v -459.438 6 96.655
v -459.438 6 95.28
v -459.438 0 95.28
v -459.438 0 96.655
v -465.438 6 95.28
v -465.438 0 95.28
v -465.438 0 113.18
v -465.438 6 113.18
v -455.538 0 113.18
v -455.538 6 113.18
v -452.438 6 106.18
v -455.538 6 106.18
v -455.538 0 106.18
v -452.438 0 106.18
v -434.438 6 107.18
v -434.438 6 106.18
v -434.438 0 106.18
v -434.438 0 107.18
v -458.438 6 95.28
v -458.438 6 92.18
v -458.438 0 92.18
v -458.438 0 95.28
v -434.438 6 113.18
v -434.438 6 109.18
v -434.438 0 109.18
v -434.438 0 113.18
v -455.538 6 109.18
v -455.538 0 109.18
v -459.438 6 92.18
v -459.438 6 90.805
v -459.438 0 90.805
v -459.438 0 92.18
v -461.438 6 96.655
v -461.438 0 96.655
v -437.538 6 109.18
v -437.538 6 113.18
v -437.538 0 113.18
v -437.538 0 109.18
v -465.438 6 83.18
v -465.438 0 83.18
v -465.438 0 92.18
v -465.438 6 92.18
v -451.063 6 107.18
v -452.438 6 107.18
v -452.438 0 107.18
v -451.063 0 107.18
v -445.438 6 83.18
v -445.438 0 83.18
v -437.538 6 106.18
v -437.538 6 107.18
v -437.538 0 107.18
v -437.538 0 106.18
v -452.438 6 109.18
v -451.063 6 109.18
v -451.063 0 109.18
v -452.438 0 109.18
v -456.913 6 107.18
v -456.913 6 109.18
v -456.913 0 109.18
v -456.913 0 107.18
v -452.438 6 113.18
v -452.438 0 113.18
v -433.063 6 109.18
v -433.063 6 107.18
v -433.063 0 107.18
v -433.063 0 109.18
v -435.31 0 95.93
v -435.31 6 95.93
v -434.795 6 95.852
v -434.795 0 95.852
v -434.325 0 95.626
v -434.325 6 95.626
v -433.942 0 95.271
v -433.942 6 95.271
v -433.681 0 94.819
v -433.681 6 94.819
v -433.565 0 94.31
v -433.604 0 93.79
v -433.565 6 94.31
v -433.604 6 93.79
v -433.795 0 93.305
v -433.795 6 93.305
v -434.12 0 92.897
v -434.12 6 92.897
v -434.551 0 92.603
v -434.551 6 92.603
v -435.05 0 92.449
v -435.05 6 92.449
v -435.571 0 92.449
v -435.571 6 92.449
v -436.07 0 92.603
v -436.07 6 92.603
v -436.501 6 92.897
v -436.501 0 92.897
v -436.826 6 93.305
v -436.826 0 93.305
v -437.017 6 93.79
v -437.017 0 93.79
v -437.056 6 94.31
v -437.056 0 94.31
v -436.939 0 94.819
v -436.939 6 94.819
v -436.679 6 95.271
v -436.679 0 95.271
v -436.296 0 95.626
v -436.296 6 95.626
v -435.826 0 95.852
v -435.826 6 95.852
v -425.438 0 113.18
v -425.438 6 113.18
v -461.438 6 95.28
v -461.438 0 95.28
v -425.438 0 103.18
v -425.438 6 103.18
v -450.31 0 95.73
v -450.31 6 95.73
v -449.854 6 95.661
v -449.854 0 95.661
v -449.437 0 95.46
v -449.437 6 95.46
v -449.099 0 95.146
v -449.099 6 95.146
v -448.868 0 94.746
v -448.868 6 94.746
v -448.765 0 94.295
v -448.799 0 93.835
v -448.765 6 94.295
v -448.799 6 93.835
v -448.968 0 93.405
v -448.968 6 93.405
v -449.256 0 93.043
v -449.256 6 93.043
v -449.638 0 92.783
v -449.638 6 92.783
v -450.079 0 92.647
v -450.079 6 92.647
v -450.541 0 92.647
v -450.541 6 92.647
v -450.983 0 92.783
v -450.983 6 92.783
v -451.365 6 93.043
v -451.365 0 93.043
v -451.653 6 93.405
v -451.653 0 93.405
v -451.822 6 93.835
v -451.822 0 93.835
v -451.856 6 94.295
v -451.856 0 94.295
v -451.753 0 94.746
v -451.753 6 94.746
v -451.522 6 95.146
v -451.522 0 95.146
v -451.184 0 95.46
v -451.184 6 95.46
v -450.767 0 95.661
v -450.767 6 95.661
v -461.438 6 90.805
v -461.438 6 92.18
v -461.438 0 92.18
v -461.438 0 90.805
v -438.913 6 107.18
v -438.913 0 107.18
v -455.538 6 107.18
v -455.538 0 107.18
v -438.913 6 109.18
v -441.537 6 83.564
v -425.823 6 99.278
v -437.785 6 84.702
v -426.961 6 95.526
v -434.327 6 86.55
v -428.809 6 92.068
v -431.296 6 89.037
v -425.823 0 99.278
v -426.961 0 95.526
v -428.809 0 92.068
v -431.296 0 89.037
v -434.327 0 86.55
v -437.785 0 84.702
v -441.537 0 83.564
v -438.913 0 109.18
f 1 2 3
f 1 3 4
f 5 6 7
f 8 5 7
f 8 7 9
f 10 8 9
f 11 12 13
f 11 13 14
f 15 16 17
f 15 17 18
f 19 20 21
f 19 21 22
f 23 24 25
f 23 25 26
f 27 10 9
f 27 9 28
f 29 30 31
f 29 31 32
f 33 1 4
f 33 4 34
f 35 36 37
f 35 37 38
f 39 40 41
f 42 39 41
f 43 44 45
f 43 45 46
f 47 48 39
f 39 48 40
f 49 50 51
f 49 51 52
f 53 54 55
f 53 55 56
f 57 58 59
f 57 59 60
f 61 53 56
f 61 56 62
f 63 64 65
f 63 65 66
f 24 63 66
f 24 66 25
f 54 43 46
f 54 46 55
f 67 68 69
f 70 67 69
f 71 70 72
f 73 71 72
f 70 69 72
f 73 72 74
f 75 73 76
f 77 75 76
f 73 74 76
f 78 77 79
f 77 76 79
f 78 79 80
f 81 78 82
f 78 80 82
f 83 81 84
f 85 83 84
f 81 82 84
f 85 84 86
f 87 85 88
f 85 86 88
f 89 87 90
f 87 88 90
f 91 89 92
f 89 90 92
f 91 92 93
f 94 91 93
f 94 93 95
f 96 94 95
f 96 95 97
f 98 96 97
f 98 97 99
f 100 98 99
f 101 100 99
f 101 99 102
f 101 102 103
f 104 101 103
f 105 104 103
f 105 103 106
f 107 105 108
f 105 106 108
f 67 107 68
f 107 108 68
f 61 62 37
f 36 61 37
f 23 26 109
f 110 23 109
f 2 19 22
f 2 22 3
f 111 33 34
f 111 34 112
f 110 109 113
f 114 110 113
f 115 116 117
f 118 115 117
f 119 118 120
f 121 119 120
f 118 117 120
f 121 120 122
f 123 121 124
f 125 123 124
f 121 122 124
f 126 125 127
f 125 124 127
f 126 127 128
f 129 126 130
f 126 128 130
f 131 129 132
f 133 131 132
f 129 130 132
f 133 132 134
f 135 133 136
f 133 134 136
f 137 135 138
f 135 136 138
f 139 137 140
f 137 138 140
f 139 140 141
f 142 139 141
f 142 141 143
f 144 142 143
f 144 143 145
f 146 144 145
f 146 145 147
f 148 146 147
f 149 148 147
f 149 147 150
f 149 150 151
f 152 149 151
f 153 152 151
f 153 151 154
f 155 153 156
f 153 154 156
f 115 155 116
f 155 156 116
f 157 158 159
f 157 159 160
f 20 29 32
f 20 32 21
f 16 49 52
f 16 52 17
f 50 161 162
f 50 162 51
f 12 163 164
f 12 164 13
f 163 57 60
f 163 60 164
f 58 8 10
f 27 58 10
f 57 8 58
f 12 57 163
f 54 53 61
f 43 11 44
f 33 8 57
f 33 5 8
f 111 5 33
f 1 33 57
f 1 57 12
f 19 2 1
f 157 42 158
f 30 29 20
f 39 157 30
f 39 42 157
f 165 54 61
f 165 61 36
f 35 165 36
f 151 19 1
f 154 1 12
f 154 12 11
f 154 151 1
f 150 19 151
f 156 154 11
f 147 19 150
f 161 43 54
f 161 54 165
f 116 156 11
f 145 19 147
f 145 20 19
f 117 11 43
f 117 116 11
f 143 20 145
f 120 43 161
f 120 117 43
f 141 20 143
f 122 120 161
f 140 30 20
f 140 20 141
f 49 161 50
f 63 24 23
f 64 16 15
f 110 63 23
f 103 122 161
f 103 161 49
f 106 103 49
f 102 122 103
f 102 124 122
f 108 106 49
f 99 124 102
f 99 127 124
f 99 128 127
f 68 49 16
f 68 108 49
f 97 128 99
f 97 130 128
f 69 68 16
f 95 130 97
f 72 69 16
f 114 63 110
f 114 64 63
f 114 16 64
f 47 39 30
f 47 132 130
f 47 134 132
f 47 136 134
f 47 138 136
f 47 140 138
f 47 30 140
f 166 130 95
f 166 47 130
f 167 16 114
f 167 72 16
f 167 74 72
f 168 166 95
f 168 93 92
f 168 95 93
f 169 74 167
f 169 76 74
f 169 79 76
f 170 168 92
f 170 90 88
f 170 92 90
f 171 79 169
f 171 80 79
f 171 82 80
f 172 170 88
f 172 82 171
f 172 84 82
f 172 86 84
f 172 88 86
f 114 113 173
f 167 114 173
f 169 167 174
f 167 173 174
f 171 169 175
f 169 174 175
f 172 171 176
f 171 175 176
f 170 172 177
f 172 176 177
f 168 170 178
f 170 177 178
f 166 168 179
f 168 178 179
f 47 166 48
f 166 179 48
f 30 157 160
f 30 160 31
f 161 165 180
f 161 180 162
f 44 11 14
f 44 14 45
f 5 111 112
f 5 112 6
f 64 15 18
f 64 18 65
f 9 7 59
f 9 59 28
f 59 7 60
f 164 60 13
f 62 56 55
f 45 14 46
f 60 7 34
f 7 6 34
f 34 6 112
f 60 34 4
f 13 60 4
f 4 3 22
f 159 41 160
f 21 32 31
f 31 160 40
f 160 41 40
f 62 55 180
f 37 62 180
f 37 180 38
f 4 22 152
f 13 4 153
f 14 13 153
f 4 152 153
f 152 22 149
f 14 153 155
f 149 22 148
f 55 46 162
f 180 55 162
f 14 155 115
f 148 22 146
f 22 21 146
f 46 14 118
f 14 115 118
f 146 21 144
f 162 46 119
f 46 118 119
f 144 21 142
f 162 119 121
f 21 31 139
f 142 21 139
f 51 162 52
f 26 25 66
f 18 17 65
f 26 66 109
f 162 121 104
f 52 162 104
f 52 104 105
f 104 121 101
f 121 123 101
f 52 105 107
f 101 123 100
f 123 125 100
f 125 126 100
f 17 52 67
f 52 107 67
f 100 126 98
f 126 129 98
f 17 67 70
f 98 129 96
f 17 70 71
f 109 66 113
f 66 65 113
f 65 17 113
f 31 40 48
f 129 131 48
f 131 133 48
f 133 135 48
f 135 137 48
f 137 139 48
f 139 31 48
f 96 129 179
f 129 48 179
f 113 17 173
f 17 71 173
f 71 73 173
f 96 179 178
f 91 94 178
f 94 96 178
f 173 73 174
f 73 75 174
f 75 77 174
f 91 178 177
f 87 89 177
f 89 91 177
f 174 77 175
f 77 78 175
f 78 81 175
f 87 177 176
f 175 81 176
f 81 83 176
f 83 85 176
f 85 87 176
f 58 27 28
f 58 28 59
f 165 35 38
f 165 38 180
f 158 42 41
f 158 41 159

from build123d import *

# Parameters (mm, degrees)
DODANIE_WYCI_GNI_CIE1_DEPTH = 6
WYTNIJ_WYCI_GNI_CIE1_DEPTH  = 6
SZYK_LINIOWY1_COUNT         = 2
SZYK_LINIOWY1_PITCH         = 18
WYTNIJ_WYCI_GNI_CIE2_DEPTH  = 6
SZKIC6_R                    = 1.75
SZKIC6_R_2                  = 1.55
WYTNIJ_WYCI_GNI_CIE3_DEPTH  = 6


with BuildPart() as part:
    # Szkic3 → Dodanie-wyciągnięcie1 (new body)
    with BuildSketch(Plane(origin=(0, 0, 0), x_dir=(1, 0, 0), z_dir=(0, 1, 0))):
        with BuildLine():
            Line((-425.43845817, -113.179624371), (-425.43845817, -103.179624371))
            ThreePointArc((-425.43845817, -103.179624371), (-431.296322547, -89.037488748), (-445.43845817, -83.179624371))
            Line((-445.43845817, -83.179624371), (-465.43845817, -83.179624371))
            Line((-465.43845817, -83.179624371), (-465.43845817, -113.179624371))
            Line((-465.43845817, -113.179624371), (-425.43845817, -113.179624371))
        make_face()
    extrude(amount=DODANIE_WYCI_GNI_CIE1_DEPTH)

    # Szkic4 → Wytnij-wyciągnięcie1 (cut)
    with BuildSketch(Plane(origin=(0, 6, 0), x_dir=(1, 0, 0), z_dir=(0, 1, 0))):
        Polygon((-434.43845817, -113.179624371), (-437.53845817, -113.179624371), (-437.53845817, -109.179624371), (-438.91345817, -109.179624371), (-438.91345817, -107.179624371), (-437.53845817, -107.179624371), (-437.53845817, -106.179624371), (-434.43845817, -106.179624371), (-434.43845817, -107.179624371), (-433.06345817, -107.179624371), (-433.06345817, -109.179624371), (-434.43845817, -109.179624371), align=None)
    wytnij_wyci_gni_cie1 = extrude(amount=-WYTNIJ_WYCI_GNI_CIE1_DEPTH, mode=Mode.SUBTRACT)

    # Szyk liniowy1: Wytnij-wyciągnięcie1 ×2
    with Locations(*[(-i * SZYK_LINIOWY1_PITCH, 0, 0) for i in range(1, SZYK_LINIOWY1_COUNT)]):
        add(wytnij_wyci_gni_cie1, mode=Mode.SUBTRACT)

    # Szkic5 → Wytnij-wyciągnięcie2 (cut)
    with BuildSketch(Plane(origin=(0, 6, 0), x_dir=(1, 0, 0), z_dir=(0, 1, 0))):
        Polygon((-465.43845817, -95.279624371), (-465.43845817, -92.179624371), (-461.43845817, -92.179624371), (-461.43845817, -90.804624371), (-459.43845817, -90.804624371), (-459.43845817, -92.179624371), (-458.43845817, -92.179624371), (-458.43845817, -95.279624371), (-459.43845817, -95.279624371), (-459.43845817, -96.654624371), (-461.43845817, -96.654624371), (-461.43845817, -95.279624371), align=None)
    extrude(amount=-WYTNIJ_WYCI_GNI_CIE2_DEPTH, mode=Mode.SUBTRACT)

    # Szkic6 → Wytnij-wyciągnięcie3 (cut)
    with BuildSketch(Plane(origin=(0, 6, 0), x_dir=(1, 0, 0), z_dir=(0, 1, 0))):
        with Locations(Location((-435.310416703, -94.179624371, 0), (0, 0, 270))):
            Circle(SZKIC6_R)
        with Locations(Location((-450.310416703, -94.179624371, 0), (0, 0, 270))):
            Circle(SZKIC6_R_2)
    extrude(amount=-WYTNIJ_WYCI_GNI_CIE3_DEPTH, mode=Mode.SUBTRACT)


solid = part.part
